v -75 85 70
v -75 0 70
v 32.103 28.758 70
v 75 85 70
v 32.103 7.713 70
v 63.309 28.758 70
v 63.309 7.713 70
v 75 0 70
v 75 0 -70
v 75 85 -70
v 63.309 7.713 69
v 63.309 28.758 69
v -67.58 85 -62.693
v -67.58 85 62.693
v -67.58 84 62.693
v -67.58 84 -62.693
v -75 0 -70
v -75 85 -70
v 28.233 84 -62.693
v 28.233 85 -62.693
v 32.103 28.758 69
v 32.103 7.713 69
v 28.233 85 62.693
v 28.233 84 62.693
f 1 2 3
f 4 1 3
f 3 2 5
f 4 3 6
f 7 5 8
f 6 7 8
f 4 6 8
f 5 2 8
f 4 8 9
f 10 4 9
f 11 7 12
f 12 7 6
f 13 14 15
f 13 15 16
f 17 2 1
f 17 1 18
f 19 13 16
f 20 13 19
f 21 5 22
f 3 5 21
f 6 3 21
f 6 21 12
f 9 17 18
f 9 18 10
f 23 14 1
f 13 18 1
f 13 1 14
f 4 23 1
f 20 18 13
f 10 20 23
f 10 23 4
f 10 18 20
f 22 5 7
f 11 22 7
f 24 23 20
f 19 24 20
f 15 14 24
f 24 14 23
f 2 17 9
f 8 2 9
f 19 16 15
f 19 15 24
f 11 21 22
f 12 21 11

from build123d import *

# Parameters (mm, degrees)
SKETCH1_W           = 150
SKETCH1_H           = 140
BOSS_EXTRUDE1_DEPTH = 85
SKETCH2_W           = 31.205424041
SKETCH2_H           = 21.045678937
CUT_EXTRUDE1_DEPTH  = 1
SKETCH3_W           = 95.813101978
SKETCH3_H           = 125.386699306
CUT_EXTRUDE2_DEPTH  = 1


with BuildPart() as part:
    # Sketch1 → Boss-Extrude1 (new body)
    with BuildSketch(Plane(origin=(0, 0, 0), x_dir=(1, 0, 0), z_dir=(0, 1, 0))):
        Rectangle(SKETCH1_W, SKETCH1_H)
    extrude(amount=BOSS_EXTRUDE1_DEPTH)

    # Sketch2 → Cut-Extrude1 (cut)
    with BuildSketch(Plane.XY.offset(70)):
        with Locations((47.705903702, 18.235389002)):
            Rectangle(SKETCH2_W, SKETCH2_H)
    extrude(amount=-CUT_EXTRUDE1_DEPTH, mode=Mode.SUBTRACT)

    # Sketch3 → Cut-Extrude2 (cut)
    with BuildSketch(Plane(origin=(0, 85, 0), x_dir=(1, 0, 0), z_dir=(0, 1, 0))):
        with Locations((-19.67334308, 0)):
            Rectangle(SKETCH3_W, SKETCH3_H)
    extrude(amount=-CUT_EXTRUDE2_DEPTH, mode=Mode.SUBTRACT)


solid = part.part
